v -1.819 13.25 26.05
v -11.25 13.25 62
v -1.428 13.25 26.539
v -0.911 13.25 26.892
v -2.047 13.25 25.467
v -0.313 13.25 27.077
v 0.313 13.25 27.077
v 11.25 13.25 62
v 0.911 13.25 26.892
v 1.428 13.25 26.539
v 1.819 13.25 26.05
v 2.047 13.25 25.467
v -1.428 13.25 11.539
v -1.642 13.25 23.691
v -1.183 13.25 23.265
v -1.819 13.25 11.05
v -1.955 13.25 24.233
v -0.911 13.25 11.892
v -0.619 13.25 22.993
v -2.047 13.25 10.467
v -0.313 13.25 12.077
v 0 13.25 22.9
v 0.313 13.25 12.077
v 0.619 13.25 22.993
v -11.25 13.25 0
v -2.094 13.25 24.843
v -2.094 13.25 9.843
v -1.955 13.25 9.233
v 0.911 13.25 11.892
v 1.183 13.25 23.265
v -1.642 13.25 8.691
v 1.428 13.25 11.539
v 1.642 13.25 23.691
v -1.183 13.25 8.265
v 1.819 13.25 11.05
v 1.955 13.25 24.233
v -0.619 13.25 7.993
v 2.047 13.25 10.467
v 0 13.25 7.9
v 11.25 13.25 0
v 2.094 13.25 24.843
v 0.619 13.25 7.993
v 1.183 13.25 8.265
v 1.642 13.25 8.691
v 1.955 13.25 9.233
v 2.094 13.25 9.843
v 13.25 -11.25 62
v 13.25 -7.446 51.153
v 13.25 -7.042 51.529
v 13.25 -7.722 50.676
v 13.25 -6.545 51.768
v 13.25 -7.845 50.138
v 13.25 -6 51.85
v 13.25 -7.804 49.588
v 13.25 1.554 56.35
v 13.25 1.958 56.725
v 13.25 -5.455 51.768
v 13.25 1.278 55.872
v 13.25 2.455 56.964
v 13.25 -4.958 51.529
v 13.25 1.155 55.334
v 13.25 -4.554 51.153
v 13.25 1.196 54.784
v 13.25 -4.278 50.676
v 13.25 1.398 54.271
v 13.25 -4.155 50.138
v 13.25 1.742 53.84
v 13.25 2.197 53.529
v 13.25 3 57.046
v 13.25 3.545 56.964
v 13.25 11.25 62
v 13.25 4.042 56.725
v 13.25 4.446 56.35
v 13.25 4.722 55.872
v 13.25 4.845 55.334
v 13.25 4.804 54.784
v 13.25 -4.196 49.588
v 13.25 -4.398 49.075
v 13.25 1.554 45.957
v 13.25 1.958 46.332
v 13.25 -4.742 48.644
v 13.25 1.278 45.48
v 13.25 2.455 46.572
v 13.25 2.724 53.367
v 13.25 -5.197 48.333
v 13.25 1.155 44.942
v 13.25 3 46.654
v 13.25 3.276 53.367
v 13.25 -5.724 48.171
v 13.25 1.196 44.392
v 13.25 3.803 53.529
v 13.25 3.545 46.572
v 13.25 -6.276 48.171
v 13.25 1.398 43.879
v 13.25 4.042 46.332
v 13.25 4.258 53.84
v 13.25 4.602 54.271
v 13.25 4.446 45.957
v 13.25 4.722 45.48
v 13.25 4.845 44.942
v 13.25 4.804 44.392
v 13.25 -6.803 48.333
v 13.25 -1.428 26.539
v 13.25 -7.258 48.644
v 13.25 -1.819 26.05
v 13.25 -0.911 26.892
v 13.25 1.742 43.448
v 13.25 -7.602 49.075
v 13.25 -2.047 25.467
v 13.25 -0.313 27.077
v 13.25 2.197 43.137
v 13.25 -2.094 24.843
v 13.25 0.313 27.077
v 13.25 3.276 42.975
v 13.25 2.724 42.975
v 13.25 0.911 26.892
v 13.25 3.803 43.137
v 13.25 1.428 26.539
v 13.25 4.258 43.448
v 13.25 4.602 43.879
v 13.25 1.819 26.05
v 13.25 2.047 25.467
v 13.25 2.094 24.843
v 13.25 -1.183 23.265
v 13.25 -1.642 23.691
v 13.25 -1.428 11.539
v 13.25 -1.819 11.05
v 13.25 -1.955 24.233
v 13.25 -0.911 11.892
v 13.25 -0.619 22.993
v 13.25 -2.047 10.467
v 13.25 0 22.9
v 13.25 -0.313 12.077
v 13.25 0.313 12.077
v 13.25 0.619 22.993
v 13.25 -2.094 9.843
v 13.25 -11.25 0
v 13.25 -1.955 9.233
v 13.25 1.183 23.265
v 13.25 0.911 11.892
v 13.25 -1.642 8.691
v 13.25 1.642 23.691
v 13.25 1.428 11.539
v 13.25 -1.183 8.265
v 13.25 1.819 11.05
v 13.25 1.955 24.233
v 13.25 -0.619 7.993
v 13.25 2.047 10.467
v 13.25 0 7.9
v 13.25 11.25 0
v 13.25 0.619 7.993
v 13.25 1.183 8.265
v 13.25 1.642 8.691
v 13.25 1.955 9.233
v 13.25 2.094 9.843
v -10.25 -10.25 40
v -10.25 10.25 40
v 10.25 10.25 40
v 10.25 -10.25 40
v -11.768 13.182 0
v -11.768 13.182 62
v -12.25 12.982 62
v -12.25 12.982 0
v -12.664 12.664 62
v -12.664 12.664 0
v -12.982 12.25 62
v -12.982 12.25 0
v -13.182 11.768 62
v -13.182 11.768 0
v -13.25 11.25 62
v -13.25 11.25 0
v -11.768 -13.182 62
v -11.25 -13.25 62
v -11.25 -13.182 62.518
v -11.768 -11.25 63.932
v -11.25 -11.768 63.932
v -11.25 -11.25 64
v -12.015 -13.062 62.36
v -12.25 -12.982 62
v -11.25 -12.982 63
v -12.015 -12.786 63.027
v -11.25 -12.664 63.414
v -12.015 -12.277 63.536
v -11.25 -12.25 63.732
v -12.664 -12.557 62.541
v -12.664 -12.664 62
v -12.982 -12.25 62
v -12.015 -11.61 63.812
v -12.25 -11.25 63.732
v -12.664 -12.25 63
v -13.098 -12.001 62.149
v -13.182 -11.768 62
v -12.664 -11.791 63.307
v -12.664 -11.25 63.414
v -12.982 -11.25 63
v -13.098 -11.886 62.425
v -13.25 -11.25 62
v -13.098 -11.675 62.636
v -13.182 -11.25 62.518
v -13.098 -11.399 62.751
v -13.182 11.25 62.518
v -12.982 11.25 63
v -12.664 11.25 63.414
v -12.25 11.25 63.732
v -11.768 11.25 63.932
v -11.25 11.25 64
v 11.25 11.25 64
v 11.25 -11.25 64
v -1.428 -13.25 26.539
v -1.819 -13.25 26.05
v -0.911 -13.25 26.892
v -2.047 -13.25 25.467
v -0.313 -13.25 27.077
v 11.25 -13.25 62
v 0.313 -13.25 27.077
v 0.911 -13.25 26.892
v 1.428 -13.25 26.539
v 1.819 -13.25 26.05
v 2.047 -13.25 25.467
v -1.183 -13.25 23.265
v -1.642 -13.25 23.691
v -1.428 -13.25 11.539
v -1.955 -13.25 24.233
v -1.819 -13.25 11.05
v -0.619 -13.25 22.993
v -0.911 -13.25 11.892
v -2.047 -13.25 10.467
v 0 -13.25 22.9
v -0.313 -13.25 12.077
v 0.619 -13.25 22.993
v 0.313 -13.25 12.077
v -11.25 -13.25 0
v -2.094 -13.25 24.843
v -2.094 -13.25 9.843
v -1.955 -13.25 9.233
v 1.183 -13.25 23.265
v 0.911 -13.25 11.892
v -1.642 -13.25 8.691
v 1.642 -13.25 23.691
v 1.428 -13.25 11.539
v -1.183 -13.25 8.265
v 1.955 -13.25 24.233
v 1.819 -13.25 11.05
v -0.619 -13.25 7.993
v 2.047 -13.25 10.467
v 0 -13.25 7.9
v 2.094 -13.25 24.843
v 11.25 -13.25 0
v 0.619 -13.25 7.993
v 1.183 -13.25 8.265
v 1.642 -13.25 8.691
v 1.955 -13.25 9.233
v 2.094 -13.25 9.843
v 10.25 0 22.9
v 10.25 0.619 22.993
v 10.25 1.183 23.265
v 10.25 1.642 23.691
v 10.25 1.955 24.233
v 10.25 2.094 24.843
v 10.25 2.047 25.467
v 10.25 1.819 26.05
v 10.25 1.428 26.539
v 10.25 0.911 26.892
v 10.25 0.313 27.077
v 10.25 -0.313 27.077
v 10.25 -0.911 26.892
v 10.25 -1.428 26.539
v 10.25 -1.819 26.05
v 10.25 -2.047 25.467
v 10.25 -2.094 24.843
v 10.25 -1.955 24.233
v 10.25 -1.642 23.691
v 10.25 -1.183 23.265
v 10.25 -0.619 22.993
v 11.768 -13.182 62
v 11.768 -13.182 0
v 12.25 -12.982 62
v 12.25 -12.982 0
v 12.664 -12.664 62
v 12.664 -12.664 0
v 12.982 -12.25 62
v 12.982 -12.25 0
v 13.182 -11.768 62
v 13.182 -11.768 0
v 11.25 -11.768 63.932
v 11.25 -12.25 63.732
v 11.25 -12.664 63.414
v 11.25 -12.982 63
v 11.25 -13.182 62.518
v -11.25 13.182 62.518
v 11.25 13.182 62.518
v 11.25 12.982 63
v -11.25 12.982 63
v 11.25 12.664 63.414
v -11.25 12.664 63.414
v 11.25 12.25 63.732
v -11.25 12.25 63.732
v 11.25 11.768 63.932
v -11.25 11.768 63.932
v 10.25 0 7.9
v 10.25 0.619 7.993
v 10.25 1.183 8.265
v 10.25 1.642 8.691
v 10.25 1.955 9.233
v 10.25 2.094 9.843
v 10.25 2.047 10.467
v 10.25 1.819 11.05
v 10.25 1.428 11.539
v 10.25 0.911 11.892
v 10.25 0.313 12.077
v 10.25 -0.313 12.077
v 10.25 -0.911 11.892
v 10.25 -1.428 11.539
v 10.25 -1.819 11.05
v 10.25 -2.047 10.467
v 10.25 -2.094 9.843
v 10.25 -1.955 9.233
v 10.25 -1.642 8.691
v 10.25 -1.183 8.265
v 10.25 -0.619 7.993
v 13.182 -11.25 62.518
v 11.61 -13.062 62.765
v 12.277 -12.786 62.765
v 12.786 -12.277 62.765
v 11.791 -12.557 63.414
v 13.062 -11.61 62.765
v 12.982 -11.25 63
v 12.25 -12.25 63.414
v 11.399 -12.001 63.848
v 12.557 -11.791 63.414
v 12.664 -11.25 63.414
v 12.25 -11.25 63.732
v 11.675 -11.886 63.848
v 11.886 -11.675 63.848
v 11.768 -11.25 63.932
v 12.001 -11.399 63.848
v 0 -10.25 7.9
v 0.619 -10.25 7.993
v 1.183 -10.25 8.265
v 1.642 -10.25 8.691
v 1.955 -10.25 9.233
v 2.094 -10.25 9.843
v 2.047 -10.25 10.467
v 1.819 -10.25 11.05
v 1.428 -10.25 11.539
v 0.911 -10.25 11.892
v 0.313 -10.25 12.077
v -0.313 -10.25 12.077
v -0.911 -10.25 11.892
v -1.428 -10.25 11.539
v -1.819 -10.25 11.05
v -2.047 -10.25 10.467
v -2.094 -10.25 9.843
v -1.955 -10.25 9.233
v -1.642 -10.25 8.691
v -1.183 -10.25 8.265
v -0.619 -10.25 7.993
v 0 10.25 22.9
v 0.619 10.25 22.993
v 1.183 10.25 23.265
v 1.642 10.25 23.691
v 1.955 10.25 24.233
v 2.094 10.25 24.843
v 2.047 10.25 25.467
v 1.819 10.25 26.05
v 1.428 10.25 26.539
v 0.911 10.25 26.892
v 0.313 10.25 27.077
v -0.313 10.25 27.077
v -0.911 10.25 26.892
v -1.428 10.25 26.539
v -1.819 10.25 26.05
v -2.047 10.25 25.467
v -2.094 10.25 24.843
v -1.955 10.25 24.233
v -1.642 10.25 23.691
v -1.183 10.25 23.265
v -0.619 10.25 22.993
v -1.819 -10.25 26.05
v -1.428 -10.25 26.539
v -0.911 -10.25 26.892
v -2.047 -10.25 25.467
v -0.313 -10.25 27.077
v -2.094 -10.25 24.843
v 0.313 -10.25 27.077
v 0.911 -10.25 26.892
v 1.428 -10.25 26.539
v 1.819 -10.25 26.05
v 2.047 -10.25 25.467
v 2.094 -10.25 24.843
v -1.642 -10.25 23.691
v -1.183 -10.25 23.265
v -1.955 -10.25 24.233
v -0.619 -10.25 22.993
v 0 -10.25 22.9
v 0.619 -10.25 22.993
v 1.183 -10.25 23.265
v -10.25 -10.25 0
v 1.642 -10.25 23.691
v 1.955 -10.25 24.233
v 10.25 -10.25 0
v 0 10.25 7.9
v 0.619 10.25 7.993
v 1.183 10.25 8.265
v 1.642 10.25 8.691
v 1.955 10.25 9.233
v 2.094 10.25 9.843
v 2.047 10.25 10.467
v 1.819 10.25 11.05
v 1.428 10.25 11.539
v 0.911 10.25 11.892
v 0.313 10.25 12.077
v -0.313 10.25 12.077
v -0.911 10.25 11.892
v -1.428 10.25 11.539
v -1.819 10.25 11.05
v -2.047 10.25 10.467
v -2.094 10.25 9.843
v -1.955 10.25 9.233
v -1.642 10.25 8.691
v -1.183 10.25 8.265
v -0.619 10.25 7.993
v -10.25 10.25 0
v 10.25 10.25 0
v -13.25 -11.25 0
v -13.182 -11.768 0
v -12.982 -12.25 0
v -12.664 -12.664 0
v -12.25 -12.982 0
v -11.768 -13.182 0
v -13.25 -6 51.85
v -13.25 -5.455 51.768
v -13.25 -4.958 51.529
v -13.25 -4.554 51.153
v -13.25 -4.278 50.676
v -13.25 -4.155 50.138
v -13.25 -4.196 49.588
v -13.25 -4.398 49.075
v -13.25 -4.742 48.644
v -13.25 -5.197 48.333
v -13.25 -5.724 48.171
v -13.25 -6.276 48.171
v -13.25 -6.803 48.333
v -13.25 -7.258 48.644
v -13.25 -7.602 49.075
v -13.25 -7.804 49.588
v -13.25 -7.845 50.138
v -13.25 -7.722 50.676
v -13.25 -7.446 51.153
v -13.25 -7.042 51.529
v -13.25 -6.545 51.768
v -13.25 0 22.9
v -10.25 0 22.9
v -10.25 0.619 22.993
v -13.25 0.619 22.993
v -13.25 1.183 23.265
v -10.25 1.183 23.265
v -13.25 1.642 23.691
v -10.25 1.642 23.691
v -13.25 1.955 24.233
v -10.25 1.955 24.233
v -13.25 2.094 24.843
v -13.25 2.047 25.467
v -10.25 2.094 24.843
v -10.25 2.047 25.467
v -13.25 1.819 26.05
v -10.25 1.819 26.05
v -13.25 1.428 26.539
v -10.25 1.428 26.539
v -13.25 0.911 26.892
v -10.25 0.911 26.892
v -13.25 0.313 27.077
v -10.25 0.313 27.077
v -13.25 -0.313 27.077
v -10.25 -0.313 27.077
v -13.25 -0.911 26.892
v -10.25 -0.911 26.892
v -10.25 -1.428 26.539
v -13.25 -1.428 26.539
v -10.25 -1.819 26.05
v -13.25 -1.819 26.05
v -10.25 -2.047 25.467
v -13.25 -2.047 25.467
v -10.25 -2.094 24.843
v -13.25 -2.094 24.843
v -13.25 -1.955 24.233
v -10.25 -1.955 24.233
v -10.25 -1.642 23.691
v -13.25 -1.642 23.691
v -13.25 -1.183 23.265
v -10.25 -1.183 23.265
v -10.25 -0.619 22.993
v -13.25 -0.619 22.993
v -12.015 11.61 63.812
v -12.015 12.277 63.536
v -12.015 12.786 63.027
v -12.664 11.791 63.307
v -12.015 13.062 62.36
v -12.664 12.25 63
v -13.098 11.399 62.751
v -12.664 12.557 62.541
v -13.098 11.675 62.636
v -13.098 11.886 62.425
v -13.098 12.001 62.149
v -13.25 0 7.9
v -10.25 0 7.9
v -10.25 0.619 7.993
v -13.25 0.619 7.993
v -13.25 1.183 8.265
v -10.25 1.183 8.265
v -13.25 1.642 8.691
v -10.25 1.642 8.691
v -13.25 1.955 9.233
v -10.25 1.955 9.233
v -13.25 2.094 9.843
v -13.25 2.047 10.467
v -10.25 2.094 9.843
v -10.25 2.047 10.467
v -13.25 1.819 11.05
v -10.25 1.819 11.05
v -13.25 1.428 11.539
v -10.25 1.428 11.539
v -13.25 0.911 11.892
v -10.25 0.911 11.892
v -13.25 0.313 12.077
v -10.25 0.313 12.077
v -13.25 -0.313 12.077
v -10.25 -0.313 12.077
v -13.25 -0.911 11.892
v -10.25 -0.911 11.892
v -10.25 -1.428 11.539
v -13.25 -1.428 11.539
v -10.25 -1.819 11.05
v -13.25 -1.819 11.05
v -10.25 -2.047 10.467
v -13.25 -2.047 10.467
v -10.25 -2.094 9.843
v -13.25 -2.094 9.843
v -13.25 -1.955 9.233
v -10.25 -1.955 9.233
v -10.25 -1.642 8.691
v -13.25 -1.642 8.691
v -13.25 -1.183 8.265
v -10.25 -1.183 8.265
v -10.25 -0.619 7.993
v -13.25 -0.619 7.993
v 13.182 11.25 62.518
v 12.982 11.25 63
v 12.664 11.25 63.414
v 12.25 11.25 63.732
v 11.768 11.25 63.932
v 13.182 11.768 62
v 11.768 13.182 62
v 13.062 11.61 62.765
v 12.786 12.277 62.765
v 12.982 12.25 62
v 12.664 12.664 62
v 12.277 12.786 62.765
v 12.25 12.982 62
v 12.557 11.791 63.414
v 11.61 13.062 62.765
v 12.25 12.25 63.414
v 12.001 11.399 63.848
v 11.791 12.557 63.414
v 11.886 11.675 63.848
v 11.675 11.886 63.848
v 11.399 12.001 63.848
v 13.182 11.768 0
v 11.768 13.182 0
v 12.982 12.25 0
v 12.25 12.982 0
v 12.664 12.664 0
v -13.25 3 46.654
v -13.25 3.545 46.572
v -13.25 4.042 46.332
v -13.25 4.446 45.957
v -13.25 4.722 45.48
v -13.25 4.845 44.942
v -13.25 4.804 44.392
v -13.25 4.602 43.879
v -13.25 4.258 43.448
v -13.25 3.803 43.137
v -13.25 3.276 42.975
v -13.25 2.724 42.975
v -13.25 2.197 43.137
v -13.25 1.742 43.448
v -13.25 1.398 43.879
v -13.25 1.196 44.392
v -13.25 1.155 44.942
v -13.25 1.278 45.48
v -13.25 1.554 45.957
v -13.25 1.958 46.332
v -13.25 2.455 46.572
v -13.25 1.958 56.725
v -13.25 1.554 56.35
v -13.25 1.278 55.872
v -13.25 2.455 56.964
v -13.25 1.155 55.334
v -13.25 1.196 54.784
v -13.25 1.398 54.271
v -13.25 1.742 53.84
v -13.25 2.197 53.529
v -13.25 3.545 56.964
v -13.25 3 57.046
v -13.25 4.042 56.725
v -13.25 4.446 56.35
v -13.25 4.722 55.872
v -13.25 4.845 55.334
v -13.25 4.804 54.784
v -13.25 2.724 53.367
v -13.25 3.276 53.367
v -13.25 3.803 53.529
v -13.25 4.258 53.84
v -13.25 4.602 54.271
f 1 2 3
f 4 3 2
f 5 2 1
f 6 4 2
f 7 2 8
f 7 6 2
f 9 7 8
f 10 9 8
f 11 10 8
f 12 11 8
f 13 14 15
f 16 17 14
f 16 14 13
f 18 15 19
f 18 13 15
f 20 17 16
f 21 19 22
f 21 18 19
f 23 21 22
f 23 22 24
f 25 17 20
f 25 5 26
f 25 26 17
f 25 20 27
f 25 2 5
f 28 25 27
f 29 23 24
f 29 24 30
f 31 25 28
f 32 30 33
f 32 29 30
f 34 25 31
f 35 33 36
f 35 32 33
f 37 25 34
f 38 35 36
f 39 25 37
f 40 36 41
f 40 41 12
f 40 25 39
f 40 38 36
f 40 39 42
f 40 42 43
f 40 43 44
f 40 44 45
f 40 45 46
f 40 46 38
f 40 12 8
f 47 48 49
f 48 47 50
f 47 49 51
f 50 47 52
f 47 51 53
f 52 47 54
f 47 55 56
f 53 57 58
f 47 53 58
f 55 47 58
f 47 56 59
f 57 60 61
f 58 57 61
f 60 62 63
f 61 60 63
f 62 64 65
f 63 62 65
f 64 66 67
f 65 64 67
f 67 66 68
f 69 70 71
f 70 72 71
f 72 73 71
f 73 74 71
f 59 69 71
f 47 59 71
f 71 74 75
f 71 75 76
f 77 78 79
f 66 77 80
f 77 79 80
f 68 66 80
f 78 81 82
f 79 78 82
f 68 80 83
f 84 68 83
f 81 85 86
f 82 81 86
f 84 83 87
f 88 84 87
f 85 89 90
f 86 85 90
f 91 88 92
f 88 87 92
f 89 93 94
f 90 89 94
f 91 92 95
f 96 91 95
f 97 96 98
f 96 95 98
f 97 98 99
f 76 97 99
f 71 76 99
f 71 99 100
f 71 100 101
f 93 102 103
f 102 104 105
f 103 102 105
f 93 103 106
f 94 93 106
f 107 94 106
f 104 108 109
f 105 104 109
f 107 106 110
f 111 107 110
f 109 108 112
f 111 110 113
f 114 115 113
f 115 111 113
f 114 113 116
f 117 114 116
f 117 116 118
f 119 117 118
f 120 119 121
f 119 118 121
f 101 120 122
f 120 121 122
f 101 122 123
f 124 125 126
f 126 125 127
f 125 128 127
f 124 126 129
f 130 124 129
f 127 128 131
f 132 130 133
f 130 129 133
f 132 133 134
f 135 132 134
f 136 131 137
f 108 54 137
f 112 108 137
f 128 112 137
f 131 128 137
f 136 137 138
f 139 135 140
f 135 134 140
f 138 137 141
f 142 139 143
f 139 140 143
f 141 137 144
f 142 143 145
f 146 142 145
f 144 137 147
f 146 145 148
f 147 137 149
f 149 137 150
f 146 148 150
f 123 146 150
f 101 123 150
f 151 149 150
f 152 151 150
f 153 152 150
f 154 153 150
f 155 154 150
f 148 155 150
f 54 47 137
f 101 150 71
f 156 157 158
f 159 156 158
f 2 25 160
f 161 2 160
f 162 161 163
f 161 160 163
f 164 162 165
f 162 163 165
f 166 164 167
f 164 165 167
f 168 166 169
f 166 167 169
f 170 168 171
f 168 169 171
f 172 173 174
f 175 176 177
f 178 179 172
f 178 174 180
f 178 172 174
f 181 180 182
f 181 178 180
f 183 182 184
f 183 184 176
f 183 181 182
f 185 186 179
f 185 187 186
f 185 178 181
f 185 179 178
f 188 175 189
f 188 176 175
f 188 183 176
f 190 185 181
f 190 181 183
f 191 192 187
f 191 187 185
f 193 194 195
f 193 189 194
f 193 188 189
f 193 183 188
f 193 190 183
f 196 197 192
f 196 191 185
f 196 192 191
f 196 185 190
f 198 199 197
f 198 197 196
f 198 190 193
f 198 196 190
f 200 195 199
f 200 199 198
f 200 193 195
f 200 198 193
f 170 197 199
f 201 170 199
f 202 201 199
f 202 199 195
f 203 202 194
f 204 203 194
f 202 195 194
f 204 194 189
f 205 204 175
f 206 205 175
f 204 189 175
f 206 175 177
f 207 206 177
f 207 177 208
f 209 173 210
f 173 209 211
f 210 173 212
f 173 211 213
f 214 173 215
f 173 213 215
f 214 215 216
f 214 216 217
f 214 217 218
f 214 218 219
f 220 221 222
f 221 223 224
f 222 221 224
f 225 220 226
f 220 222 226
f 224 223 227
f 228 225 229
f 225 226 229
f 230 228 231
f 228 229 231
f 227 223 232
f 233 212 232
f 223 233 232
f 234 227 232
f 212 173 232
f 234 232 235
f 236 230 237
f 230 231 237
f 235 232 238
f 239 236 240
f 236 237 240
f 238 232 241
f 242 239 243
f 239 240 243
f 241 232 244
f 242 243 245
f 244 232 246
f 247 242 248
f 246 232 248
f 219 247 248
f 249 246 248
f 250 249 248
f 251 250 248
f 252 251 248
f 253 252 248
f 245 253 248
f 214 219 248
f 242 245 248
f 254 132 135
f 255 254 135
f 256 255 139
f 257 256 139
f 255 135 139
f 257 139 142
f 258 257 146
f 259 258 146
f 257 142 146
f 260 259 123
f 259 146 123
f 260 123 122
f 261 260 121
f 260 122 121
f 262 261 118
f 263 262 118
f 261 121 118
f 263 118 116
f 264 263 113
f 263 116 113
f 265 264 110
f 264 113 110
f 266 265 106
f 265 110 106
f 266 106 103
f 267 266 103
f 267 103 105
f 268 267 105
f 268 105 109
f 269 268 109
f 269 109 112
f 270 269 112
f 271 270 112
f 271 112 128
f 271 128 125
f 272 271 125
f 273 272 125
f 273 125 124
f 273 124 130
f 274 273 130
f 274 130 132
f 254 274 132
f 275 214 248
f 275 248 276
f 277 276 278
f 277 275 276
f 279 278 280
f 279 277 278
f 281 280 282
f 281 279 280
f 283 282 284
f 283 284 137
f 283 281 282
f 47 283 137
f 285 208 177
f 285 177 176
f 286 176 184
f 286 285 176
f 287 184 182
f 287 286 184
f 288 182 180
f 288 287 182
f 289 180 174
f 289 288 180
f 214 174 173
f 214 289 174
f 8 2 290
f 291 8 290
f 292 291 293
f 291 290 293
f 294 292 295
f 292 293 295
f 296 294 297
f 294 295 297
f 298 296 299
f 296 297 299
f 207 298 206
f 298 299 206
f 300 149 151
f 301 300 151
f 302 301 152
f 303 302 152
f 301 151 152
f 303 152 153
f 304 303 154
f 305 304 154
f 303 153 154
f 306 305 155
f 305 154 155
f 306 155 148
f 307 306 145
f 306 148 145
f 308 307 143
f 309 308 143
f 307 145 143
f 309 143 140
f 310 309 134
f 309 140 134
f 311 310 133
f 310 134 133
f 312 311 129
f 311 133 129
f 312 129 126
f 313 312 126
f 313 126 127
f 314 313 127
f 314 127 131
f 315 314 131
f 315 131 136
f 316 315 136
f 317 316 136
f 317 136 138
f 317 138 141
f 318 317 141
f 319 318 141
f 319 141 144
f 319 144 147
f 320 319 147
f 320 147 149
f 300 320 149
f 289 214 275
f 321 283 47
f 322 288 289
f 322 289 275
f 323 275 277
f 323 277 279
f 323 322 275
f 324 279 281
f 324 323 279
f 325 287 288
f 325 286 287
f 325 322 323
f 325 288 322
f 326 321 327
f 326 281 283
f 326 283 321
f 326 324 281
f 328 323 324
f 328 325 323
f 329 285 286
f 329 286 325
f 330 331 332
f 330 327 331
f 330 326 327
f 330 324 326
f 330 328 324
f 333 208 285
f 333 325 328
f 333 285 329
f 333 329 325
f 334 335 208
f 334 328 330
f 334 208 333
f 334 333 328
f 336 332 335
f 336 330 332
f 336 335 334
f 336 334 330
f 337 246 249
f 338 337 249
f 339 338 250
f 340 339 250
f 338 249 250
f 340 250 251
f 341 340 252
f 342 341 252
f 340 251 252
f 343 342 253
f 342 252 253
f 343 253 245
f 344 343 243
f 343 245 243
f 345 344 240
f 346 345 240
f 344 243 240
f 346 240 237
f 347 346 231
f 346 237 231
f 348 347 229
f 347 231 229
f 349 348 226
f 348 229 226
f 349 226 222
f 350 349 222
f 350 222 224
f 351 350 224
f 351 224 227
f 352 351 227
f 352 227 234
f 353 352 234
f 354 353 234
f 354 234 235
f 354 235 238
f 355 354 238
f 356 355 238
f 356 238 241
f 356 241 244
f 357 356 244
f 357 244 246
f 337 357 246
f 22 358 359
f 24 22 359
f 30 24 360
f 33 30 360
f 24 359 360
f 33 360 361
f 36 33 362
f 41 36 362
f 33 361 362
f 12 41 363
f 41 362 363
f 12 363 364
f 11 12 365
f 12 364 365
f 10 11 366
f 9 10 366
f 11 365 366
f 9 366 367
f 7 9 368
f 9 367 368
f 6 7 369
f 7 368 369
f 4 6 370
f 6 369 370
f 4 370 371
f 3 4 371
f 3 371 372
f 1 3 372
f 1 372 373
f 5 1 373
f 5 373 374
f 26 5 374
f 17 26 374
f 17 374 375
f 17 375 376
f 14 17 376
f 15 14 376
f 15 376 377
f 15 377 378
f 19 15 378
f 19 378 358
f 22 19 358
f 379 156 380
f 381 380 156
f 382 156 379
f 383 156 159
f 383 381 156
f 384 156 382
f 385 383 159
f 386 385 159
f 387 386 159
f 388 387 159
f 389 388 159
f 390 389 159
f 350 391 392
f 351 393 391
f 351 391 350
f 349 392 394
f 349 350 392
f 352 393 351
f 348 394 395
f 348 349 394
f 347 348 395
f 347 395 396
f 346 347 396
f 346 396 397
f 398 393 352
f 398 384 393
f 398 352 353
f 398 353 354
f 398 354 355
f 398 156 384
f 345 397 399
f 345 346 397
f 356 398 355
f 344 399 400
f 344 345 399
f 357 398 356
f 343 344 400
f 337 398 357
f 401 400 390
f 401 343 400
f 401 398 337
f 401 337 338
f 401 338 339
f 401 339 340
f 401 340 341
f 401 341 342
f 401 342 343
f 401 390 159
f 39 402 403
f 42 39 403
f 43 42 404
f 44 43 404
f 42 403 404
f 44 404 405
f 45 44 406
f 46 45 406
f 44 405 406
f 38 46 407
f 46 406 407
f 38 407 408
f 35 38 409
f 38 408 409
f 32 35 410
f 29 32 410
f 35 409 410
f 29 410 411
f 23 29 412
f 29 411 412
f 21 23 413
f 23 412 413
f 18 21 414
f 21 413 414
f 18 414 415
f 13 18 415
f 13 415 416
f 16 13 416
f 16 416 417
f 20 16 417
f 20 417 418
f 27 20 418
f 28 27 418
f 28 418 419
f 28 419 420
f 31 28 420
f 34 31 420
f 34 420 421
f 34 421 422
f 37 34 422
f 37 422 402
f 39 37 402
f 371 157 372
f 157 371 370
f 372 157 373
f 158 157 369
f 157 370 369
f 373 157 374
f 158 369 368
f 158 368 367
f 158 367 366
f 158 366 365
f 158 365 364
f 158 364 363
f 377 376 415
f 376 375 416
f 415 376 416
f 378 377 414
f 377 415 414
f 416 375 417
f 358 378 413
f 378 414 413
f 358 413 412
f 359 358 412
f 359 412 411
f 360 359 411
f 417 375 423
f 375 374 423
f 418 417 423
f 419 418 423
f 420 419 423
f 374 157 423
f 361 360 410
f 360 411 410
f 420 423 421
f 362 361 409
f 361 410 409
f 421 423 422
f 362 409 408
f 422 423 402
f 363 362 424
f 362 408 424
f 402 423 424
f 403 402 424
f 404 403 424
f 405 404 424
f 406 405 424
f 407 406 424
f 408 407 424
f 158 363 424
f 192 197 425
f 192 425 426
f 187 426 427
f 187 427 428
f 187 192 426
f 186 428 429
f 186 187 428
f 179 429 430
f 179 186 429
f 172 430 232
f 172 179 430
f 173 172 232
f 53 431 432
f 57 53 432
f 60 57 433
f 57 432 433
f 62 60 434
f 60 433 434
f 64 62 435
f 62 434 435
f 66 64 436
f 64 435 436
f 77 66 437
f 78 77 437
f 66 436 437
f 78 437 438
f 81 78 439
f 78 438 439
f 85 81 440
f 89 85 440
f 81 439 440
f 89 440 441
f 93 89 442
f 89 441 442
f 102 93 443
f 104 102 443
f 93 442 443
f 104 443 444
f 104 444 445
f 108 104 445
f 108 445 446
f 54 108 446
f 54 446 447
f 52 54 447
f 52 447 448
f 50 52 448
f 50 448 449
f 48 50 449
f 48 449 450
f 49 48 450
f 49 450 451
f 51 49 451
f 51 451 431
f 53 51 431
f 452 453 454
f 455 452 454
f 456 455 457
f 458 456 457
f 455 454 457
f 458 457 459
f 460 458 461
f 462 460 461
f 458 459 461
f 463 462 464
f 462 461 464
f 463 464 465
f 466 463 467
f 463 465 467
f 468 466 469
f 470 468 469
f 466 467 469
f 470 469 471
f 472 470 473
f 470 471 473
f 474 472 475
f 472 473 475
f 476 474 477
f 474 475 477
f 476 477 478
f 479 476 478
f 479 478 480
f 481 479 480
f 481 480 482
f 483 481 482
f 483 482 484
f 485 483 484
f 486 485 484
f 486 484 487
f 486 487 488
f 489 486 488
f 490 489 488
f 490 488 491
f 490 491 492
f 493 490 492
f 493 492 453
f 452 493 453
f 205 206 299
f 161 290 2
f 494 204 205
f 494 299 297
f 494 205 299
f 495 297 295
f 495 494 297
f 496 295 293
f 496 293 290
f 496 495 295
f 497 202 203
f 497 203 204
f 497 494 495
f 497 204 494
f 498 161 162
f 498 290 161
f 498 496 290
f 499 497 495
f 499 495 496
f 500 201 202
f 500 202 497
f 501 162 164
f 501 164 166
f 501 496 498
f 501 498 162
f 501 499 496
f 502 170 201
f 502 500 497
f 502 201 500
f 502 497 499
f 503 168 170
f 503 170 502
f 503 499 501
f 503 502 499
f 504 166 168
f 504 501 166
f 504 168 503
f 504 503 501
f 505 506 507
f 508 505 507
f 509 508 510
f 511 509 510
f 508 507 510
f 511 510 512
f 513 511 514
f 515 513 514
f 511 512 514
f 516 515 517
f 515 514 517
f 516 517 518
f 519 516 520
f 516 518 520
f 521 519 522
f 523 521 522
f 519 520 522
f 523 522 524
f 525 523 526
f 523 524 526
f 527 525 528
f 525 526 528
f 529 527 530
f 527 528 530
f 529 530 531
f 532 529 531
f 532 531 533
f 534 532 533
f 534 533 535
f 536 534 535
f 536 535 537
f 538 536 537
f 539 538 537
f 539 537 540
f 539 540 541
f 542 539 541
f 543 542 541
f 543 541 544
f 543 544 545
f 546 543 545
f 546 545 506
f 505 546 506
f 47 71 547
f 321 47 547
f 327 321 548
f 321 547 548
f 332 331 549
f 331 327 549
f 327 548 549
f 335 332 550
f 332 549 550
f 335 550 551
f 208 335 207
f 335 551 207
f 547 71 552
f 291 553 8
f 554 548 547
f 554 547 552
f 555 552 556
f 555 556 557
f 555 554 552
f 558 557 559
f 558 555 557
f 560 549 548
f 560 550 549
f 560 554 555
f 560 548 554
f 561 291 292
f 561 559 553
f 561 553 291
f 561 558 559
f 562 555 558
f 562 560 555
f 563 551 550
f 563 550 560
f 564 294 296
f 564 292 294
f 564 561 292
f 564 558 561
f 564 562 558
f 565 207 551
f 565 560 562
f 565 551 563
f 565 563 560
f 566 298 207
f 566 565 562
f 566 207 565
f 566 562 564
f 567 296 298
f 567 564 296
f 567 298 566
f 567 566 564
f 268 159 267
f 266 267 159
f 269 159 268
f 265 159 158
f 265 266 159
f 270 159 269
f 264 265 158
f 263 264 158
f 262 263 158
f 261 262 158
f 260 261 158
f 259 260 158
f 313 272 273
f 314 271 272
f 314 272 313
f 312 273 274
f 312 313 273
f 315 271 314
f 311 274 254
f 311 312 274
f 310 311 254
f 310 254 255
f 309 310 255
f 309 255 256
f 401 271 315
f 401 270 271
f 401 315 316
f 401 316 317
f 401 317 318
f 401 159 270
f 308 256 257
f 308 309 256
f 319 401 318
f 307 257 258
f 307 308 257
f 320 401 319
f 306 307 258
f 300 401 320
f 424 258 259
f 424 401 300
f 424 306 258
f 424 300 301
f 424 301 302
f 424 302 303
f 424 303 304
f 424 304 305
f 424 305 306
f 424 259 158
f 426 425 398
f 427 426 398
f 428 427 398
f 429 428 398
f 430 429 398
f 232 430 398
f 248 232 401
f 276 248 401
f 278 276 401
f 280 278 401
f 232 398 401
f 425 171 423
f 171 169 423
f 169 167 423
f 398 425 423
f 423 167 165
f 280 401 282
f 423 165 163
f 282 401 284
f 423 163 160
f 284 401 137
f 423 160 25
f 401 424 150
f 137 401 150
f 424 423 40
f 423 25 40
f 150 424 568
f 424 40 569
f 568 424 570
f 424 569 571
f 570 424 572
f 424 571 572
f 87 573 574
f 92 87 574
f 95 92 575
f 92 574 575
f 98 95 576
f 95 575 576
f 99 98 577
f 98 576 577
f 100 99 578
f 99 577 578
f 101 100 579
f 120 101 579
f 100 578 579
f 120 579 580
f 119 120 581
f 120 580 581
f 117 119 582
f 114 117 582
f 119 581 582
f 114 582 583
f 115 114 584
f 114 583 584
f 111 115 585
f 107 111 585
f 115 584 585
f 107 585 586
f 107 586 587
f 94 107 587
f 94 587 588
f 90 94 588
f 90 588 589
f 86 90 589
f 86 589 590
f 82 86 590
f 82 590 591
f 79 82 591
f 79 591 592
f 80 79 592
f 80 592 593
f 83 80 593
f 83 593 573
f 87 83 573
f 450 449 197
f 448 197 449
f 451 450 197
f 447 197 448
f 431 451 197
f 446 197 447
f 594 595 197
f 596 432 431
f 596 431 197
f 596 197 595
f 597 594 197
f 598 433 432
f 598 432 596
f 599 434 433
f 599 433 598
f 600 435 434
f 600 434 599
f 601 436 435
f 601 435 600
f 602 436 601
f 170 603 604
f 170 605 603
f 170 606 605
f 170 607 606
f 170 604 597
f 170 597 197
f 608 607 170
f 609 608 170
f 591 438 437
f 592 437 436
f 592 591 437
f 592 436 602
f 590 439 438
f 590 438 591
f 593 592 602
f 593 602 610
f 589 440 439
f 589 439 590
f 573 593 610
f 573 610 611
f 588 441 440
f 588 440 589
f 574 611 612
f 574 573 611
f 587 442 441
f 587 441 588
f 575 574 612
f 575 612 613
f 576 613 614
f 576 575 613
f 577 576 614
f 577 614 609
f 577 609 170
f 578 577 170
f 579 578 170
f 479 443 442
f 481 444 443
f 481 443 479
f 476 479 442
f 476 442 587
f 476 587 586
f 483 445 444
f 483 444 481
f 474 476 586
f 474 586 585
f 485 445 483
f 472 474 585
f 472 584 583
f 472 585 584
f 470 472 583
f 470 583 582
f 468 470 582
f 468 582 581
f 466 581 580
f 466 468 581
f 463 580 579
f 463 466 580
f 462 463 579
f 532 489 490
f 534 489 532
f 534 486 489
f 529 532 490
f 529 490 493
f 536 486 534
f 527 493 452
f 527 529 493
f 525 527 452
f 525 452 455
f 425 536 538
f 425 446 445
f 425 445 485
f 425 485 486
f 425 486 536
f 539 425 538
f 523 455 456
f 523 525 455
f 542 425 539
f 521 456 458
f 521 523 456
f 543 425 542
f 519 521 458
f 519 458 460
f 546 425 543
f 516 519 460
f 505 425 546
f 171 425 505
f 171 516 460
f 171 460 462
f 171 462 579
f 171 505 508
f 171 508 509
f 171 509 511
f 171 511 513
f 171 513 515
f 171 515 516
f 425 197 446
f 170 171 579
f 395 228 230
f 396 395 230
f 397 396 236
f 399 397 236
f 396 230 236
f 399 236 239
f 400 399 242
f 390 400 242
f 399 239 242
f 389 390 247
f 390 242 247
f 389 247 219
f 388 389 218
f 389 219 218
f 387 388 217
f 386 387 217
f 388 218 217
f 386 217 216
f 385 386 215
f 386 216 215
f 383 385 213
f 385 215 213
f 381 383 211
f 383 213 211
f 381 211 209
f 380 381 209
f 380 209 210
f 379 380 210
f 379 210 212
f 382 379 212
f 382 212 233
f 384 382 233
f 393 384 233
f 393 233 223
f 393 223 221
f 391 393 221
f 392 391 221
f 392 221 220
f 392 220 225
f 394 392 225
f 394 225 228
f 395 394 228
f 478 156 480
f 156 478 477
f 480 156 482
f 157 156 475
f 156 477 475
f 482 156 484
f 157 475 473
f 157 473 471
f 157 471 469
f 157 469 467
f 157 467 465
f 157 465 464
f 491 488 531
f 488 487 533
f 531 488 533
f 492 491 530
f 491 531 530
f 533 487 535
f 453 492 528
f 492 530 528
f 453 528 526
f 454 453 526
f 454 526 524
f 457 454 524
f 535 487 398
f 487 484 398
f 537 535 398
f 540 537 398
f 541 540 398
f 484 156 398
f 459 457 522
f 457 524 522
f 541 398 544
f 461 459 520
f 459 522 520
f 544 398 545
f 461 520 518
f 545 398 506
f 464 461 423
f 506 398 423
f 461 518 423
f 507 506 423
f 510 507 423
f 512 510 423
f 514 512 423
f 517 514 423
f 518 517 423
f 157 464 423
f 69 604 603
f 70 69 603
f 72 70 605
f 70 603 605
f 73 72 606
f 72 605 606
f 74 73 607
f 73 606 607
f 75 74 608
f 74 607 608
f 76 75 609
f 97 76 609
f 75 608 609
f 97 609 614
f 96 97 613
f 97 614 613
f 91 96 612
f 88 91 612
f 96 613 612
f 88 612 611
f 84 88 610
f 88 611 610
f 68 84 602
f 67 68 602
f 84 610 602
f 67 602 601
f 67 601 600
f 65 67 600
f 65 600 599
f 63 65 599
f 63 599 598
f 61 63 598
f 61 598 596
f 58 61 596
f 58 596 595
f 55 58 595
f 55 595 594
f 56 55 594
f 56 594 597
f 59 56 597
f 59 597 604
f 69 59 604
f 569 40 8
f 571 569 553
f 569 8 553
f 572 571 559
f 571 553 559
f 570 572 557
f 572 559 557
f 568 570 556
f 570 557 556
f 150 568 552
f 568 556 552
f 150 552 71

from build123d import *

# Parameters (mm, degrees)
SKETCH_1_W           = 26.5
SKETCH_1_H           = 26.5
SKETCH_1_W_2         = 20.5
SKETCH_1_H_2         = 20.5
EXTRUDE_1_DEPTH      = 40
SKETCH_3_W           = 26.5
SKETCH_3_H           = 26.5
EXTRUDE_2_DEPTH      = 20
SKETCH_9_W           = 26.5
SKETCH_9_H           = 26.5
EXTRUDE_5_DEPTH      = 4
SKETCH_10_R          = 12
SKETCH_10_R_2        = 10
EXTRUDE_7_DEPTH      = 4
EXTRUDE_START        = 4
SKETCH_12_R          = 12
SKETCH_12_R_2        = 10
EXTRUDE_8_DEPTH      = 4
SKETCH_13_R          = 1.85
CUT_EXTRUDE_3_DEPTH  = 73.123591841
SKETCH_15_R          = 2.1
CUT_EXTRUDE_5_DEPTH  = 73.123591841
SKETCH_14_R          = 2.1
CUT_EXTRUDE_6_DEPTH  = 72.384959901
SKETCH_18_R          = 12
CUT_EXTRUDE_9_DEPTH  = 4
CUT_EXTRUDE_START    = 4
SKETCH_19_R          = 12
CUT_EXTRUDE_11_DEPTH = 4
FILLET_6_R           = 2
FILLET_7_R           = 2
FILLET_8_R           = 2
FILLET_9_R           = 2


with BuildPart() as part:
    # 草图1 → 凸台-拉伸1 (new body)
    with BuildSketch(Plane.XY):
        Rectangle(SKETCH_1_W, SKETCH_1_H)
        Rectangle(SKETCH_1_W_2, SKETCH_1_H_2, mode=Mode.SUBTRACT)
    extrude(amount=EXTRUDE_1_DEPTH)

    # 草图3 → 凸台-拉伸2 (add)
    with BuildSketch(Plane.XY.offset(40)):
        Rectangle(SKETCH_3_W, SKETCH_3_H)
    extrude(amount=EXTRUDE_2_DEPTH)

    # 草图9 → 凸台-拉伸5 (add)
    with BuildSketch(Plane.XY.offset(60)):
        Rectangle(SKETCH_9_W, SKETCH_9_H)
    extrude(amount=EXTRUDE_5_DEPTH)

    # 草图10 → 凸台-拉伸7 (add)
    with BuildSketch(Plane(origin=(13.25, 0, 0), x_dir=(0, 0, -1), z_dir=(1, 0, 0))):
        with Locations(Location((-50, 0, 0), (0, 0, 180))):
            Circle(SKETCH_10_R)
        with Locations((-50, 0)):
            Circle(SKETCH_10_R_2, mode=Mode.SUBTRACT)
    extrude(amount=EXTRUDE_7_DEPTH)

    # 草图12 → 凸台-拉伸8 (add)
    with BuildSketch(Plane.ZY.offset(13.25).offset(EXTRUDE_START)):
        with Locations((50, 0)):
            Circle(SKETCH_12_R)
        with Locations(Location((50, 0, 0), (0, 0, 180))):
            Circle(SKETCH_12_R_2, mode=Mode.SUBTRACT)
    extrude(amount=-EXTRUDE_8_DEPTH)

    # 草图13 → 切除-拉伸3 (cut, through all)
    with BuildSketch(Plane.ZY.offset(13.25)):
        with Locations((55.196152423, 3)):
            Circle(SKETCH_13_R)
        with Locations((50, -6)):
            Circle(SKETCH_13_R)
        with Locations((44.803847577, 3)):
            Circle(SKETCH_13_R)
    extrude(amount=-CUT_EXTRUDE_3_DEPTH, mode=Mode.SUBTRACT)

    # 草图15 → 切除-拉伸5 (cut, through all)
    with BuildSketch(Plane(origin=(13.25, 0, 0), x_dir=(0, 0, -1), z_dir=(1, 0, 0))):
        with Locations((-10, 0)):
            Circle(SKETCH_15_R)
        with Locations((-25, 0)):
            Circle(SKETCH_15_R)
    extrude(amount=-CUT_EXTRUDE_5_DEPTH, mode=Mode.SUBTRACT)

    # 草图14 → 切除-拉伸6 (cut, through all)
    with BuildSketch(Plane.XZ.offset(13.25)):
        with Locations(Location((0, 10, 0), (0, 0, 270))):
            Circle(SKETCH_14_R)
        with Locations(Location((0, 25, 0), (0, 0, 270))):
            Circle(SKETCH_14_R)
    extrude(amount=-CUT_EXTRUDE_6_DEPTH, mode=Mode.SUBTRACT)

    # 草图18 → 切除-拉伸9 (cut)
    with BuildSketch(Plane(origin=(13.25, 0, 0), x_dir=(0, 0, -1), z_dir=(1, 0, 0))):
        with Locations((-50, 0)):
            Circle(SKETCH_18_R)
    extrude(amount=CUT_EXTRUDE_9_DEPTH, mode=Mode.SUBTRACT)

    # 草图19 → 切除-拉伸11 (cut)
    with BuildSketch(Plane.ZY.offset(13.25).offset(CUT_EXTRUDE_START)):
        with Locations((50, 0)):
            Circle(SKETCH_19_R)
    extrude(amount=-CUT_EXTRUDE_11_DEPTH, mode=Mode.SUBTRACT)

    # 圆角6
    fillet_6_edges = [part.edges().sort_by_distance(p)[0] for p in [
        (0, -13.25, 64),
        (13.25, -13.25, 32),
        (-13.25, -13.25, 32),
    ]]
    fillet(fillet_6_edges, radius=FILLET_6_R)

    # 圆角7
    # the kernel refuses this fillet: 2 mm, written as the material it takes off along each edge
    with BuildSketch(Plane(origin=(11.25, -11.25, 62), x_dir=(1, 0, 0), z_dir=(0, 0, 1))) as fillet_7_piece_1_section:
        Polygon((0, 0), (FILLET_7_R, 0), (FILLET_7_R, -FILLET_7_R), (0, -FILLET_7_R), align=None)
    fillet_7_piece_1 = extrude(amount=FILLET_7_R, mode=Mode.PRIVATE)
    fillet_7_piece_1 = fillet_7_piece_1 - Plane(origin=(11.25, -11.25, 62), x_dir=(-0.7071067811865475, 0.7071067811865475, 0), z_dir=(0, 0, 1)) * Sphere(FILLET_7_R, mode=Mode.PRIVATE)
    add(fillet_7_piece_1, mode=Mode.SUBTRACT)
    with BuildSketch(Plane(origin=(13.25, 18.25, 64), x_dir=(-1, 0, 0), z_dir=(0, -1, 0))) as fillet_7_piece_2:
        with BuildLine():
            CenterArc((FILLET_7_R, FILLET_7_R), FILLET_7_R, 180, 90)
            Line((0, FILLET_7_R), (0, 0))
            Line((0, 0), (FILLET_7_R, 0))
        make_face()
    extrude(amount=29.5, mode=Mode.SUBTRACT)
    with BuildSketch(Plane(origin=(13.25, 13.25, 69), x_dir=(-1, 0, 0), z_dir=(0, 0, -1))) as fillet_7_piece_3:
        with BuildLine():
            CenterArc((FILLET_7_R, -FILLET_7_R), FILLET_7_R, 90, 90)
            Line((0, -FILLET_7_R), (0, 0))
            Line((0, 0), (FILLET_7_R, 0))
        make_face()
    extrude(amount=74, mode=Mode.SUBTRACT)

    # 圆角8
    # the kernel refuses this fillet: 2 mm, written as the material it takes off along each edge
    with BuildSketch(Plane(origin=(11.25, 11.25, 62), x_dir=(0, 1, 0), z_dir=(0, 0, 1))) as fillet_8_piece_1_section:
        Polygon((0, 0), (FILLET_8_R, 0), (FILLET_8_R, -FILLET_8_R), (0, -FILLET_8_R), align=None)
    fillet_8_piece_1 = extrude(amount=FILLET_8_R, mode=Mode.PRIVATE)
    fillet_8_piece_1 = fillet_8_piece_1 - Plane(origin=(11.25, 11.25, 62), x_dir=(-0.7071067811865475, -0.7071067811865475, 0), z_dir=(0, 0, 1)) * Sphere(FILLET_8_R, mode=Mode.PRIVATE)
    add(fillet_8_piece_1, mode=Mode.SUBTRACT)
    with BuildSketch(Plane(origin=(-18.25, 13.25, 64), x_dir=(0, -1, 0), z_dir=(1, 0, 0))) as fillet_8_piece_2:
        with BuildLine():
            CenterArc((FILLET_8_R, FILLET_8_R), FILLET_8_R, 180, 90)
            Line((0, FILLET_8_R), (0, 0))
            Line((0, 0), (FILLET_8_R, 0))
        make_face()
    extrude(amount=29.5, mode=Mode.SUBTRACT)
    with BuildSketch(Plane(origin=(-13.25, 13.25, -5), x_dir=(0, -1, 0), z_dir=(0, 0, 1))) as fillet_8_piece_3:
        with BuildLine():
            CenterArc((FILLET_8_R, FILLET_8_R), FILLET_8_R, 180, 90)
            Line((0, FILLET_8_R), (0, 0))
            Line((0, 0), (FILLET_8_R, 0))
        make_face()
    extrude(amount=74, mode=Mode.SUBTRACT)

    # 圆角9
    # the kernel refuses this fillet: 2 mm, written as the material it takes off along each edge
    with BuildSketch(Plane(origin=(-11.25, -11.25, 62), x_dir=(0, 0, 1), z_dir=(-1, 0, 0))) as fillet_9_piece_1_section:
        Polygon((0, 0), (FILLET_9_R, 0), (FILLET_9_R, -FILLET_9_R), (0, -FILLET_9_R), align=None)
    fillet_9_piece_1 = extrude(amount=FILLET_9_R, mode=Mode.PRIVATE)
    fillet_9_piece_1 = fillet_9_piece_1 - Plane(origin=(-11.25, -11.25, 62), x_dir=(0, 0.7071067811865475, -0.7071067811865475), z_dir=(-1, 0, 0)) * Sphere(FILLET_9_R, mode=Mode.PRIVATE)
    add(fillet_9_piece_1, mode=Mode.SUBTRACT)
    with BuildSketch(Plane(origin=(-11.25, 11.25, 62), x_dir=(0, 0, 1), z_dir=(-1, 0, 0))) as fillet_9_piece_2_section:
        Polygon((0, 0), (FILLET_9_R, 0), (FILLET_9_R, FILLET_9_R), (0, FILLET_9_R), align=None)
    fillet_9_piece_2 = extrude(amount=FILLET_9_R, mode=Mode.PRIVATE)
    fillet_9_piece_2 = fillet_9_piece_2 - Plane(origin=(-11.25, 11.25, 62), x_dir=(0, -0.7071067811865475, -0.7071067811865475), z_dir=(-1, 0, 0)) * Sphere(FILLET_9_R, mode=Mode.PRIVATE)
    add(fillet_9_piece_2, mode=Mode.SUBTRACT)
    with BuildSketch(Plane(origin=(-13.25, -11.25, 64), x_dir=(0, 0, -1), z_dir=(0, 1, 0))) as fillet_9_piece_3:
        with BuildLine():
            CenterArc((FILLET_9_R, -FILLET_9_R), FILLET_9_R, 90, 90)
            Line((0, -FILLET_9_R), (0, 0))
            Line((0, 0), (FILLET_9_R, 0))
        make_face()
    extrude(amount=22.5, mode=Mode.SUBTRACT)


solid = part.part
